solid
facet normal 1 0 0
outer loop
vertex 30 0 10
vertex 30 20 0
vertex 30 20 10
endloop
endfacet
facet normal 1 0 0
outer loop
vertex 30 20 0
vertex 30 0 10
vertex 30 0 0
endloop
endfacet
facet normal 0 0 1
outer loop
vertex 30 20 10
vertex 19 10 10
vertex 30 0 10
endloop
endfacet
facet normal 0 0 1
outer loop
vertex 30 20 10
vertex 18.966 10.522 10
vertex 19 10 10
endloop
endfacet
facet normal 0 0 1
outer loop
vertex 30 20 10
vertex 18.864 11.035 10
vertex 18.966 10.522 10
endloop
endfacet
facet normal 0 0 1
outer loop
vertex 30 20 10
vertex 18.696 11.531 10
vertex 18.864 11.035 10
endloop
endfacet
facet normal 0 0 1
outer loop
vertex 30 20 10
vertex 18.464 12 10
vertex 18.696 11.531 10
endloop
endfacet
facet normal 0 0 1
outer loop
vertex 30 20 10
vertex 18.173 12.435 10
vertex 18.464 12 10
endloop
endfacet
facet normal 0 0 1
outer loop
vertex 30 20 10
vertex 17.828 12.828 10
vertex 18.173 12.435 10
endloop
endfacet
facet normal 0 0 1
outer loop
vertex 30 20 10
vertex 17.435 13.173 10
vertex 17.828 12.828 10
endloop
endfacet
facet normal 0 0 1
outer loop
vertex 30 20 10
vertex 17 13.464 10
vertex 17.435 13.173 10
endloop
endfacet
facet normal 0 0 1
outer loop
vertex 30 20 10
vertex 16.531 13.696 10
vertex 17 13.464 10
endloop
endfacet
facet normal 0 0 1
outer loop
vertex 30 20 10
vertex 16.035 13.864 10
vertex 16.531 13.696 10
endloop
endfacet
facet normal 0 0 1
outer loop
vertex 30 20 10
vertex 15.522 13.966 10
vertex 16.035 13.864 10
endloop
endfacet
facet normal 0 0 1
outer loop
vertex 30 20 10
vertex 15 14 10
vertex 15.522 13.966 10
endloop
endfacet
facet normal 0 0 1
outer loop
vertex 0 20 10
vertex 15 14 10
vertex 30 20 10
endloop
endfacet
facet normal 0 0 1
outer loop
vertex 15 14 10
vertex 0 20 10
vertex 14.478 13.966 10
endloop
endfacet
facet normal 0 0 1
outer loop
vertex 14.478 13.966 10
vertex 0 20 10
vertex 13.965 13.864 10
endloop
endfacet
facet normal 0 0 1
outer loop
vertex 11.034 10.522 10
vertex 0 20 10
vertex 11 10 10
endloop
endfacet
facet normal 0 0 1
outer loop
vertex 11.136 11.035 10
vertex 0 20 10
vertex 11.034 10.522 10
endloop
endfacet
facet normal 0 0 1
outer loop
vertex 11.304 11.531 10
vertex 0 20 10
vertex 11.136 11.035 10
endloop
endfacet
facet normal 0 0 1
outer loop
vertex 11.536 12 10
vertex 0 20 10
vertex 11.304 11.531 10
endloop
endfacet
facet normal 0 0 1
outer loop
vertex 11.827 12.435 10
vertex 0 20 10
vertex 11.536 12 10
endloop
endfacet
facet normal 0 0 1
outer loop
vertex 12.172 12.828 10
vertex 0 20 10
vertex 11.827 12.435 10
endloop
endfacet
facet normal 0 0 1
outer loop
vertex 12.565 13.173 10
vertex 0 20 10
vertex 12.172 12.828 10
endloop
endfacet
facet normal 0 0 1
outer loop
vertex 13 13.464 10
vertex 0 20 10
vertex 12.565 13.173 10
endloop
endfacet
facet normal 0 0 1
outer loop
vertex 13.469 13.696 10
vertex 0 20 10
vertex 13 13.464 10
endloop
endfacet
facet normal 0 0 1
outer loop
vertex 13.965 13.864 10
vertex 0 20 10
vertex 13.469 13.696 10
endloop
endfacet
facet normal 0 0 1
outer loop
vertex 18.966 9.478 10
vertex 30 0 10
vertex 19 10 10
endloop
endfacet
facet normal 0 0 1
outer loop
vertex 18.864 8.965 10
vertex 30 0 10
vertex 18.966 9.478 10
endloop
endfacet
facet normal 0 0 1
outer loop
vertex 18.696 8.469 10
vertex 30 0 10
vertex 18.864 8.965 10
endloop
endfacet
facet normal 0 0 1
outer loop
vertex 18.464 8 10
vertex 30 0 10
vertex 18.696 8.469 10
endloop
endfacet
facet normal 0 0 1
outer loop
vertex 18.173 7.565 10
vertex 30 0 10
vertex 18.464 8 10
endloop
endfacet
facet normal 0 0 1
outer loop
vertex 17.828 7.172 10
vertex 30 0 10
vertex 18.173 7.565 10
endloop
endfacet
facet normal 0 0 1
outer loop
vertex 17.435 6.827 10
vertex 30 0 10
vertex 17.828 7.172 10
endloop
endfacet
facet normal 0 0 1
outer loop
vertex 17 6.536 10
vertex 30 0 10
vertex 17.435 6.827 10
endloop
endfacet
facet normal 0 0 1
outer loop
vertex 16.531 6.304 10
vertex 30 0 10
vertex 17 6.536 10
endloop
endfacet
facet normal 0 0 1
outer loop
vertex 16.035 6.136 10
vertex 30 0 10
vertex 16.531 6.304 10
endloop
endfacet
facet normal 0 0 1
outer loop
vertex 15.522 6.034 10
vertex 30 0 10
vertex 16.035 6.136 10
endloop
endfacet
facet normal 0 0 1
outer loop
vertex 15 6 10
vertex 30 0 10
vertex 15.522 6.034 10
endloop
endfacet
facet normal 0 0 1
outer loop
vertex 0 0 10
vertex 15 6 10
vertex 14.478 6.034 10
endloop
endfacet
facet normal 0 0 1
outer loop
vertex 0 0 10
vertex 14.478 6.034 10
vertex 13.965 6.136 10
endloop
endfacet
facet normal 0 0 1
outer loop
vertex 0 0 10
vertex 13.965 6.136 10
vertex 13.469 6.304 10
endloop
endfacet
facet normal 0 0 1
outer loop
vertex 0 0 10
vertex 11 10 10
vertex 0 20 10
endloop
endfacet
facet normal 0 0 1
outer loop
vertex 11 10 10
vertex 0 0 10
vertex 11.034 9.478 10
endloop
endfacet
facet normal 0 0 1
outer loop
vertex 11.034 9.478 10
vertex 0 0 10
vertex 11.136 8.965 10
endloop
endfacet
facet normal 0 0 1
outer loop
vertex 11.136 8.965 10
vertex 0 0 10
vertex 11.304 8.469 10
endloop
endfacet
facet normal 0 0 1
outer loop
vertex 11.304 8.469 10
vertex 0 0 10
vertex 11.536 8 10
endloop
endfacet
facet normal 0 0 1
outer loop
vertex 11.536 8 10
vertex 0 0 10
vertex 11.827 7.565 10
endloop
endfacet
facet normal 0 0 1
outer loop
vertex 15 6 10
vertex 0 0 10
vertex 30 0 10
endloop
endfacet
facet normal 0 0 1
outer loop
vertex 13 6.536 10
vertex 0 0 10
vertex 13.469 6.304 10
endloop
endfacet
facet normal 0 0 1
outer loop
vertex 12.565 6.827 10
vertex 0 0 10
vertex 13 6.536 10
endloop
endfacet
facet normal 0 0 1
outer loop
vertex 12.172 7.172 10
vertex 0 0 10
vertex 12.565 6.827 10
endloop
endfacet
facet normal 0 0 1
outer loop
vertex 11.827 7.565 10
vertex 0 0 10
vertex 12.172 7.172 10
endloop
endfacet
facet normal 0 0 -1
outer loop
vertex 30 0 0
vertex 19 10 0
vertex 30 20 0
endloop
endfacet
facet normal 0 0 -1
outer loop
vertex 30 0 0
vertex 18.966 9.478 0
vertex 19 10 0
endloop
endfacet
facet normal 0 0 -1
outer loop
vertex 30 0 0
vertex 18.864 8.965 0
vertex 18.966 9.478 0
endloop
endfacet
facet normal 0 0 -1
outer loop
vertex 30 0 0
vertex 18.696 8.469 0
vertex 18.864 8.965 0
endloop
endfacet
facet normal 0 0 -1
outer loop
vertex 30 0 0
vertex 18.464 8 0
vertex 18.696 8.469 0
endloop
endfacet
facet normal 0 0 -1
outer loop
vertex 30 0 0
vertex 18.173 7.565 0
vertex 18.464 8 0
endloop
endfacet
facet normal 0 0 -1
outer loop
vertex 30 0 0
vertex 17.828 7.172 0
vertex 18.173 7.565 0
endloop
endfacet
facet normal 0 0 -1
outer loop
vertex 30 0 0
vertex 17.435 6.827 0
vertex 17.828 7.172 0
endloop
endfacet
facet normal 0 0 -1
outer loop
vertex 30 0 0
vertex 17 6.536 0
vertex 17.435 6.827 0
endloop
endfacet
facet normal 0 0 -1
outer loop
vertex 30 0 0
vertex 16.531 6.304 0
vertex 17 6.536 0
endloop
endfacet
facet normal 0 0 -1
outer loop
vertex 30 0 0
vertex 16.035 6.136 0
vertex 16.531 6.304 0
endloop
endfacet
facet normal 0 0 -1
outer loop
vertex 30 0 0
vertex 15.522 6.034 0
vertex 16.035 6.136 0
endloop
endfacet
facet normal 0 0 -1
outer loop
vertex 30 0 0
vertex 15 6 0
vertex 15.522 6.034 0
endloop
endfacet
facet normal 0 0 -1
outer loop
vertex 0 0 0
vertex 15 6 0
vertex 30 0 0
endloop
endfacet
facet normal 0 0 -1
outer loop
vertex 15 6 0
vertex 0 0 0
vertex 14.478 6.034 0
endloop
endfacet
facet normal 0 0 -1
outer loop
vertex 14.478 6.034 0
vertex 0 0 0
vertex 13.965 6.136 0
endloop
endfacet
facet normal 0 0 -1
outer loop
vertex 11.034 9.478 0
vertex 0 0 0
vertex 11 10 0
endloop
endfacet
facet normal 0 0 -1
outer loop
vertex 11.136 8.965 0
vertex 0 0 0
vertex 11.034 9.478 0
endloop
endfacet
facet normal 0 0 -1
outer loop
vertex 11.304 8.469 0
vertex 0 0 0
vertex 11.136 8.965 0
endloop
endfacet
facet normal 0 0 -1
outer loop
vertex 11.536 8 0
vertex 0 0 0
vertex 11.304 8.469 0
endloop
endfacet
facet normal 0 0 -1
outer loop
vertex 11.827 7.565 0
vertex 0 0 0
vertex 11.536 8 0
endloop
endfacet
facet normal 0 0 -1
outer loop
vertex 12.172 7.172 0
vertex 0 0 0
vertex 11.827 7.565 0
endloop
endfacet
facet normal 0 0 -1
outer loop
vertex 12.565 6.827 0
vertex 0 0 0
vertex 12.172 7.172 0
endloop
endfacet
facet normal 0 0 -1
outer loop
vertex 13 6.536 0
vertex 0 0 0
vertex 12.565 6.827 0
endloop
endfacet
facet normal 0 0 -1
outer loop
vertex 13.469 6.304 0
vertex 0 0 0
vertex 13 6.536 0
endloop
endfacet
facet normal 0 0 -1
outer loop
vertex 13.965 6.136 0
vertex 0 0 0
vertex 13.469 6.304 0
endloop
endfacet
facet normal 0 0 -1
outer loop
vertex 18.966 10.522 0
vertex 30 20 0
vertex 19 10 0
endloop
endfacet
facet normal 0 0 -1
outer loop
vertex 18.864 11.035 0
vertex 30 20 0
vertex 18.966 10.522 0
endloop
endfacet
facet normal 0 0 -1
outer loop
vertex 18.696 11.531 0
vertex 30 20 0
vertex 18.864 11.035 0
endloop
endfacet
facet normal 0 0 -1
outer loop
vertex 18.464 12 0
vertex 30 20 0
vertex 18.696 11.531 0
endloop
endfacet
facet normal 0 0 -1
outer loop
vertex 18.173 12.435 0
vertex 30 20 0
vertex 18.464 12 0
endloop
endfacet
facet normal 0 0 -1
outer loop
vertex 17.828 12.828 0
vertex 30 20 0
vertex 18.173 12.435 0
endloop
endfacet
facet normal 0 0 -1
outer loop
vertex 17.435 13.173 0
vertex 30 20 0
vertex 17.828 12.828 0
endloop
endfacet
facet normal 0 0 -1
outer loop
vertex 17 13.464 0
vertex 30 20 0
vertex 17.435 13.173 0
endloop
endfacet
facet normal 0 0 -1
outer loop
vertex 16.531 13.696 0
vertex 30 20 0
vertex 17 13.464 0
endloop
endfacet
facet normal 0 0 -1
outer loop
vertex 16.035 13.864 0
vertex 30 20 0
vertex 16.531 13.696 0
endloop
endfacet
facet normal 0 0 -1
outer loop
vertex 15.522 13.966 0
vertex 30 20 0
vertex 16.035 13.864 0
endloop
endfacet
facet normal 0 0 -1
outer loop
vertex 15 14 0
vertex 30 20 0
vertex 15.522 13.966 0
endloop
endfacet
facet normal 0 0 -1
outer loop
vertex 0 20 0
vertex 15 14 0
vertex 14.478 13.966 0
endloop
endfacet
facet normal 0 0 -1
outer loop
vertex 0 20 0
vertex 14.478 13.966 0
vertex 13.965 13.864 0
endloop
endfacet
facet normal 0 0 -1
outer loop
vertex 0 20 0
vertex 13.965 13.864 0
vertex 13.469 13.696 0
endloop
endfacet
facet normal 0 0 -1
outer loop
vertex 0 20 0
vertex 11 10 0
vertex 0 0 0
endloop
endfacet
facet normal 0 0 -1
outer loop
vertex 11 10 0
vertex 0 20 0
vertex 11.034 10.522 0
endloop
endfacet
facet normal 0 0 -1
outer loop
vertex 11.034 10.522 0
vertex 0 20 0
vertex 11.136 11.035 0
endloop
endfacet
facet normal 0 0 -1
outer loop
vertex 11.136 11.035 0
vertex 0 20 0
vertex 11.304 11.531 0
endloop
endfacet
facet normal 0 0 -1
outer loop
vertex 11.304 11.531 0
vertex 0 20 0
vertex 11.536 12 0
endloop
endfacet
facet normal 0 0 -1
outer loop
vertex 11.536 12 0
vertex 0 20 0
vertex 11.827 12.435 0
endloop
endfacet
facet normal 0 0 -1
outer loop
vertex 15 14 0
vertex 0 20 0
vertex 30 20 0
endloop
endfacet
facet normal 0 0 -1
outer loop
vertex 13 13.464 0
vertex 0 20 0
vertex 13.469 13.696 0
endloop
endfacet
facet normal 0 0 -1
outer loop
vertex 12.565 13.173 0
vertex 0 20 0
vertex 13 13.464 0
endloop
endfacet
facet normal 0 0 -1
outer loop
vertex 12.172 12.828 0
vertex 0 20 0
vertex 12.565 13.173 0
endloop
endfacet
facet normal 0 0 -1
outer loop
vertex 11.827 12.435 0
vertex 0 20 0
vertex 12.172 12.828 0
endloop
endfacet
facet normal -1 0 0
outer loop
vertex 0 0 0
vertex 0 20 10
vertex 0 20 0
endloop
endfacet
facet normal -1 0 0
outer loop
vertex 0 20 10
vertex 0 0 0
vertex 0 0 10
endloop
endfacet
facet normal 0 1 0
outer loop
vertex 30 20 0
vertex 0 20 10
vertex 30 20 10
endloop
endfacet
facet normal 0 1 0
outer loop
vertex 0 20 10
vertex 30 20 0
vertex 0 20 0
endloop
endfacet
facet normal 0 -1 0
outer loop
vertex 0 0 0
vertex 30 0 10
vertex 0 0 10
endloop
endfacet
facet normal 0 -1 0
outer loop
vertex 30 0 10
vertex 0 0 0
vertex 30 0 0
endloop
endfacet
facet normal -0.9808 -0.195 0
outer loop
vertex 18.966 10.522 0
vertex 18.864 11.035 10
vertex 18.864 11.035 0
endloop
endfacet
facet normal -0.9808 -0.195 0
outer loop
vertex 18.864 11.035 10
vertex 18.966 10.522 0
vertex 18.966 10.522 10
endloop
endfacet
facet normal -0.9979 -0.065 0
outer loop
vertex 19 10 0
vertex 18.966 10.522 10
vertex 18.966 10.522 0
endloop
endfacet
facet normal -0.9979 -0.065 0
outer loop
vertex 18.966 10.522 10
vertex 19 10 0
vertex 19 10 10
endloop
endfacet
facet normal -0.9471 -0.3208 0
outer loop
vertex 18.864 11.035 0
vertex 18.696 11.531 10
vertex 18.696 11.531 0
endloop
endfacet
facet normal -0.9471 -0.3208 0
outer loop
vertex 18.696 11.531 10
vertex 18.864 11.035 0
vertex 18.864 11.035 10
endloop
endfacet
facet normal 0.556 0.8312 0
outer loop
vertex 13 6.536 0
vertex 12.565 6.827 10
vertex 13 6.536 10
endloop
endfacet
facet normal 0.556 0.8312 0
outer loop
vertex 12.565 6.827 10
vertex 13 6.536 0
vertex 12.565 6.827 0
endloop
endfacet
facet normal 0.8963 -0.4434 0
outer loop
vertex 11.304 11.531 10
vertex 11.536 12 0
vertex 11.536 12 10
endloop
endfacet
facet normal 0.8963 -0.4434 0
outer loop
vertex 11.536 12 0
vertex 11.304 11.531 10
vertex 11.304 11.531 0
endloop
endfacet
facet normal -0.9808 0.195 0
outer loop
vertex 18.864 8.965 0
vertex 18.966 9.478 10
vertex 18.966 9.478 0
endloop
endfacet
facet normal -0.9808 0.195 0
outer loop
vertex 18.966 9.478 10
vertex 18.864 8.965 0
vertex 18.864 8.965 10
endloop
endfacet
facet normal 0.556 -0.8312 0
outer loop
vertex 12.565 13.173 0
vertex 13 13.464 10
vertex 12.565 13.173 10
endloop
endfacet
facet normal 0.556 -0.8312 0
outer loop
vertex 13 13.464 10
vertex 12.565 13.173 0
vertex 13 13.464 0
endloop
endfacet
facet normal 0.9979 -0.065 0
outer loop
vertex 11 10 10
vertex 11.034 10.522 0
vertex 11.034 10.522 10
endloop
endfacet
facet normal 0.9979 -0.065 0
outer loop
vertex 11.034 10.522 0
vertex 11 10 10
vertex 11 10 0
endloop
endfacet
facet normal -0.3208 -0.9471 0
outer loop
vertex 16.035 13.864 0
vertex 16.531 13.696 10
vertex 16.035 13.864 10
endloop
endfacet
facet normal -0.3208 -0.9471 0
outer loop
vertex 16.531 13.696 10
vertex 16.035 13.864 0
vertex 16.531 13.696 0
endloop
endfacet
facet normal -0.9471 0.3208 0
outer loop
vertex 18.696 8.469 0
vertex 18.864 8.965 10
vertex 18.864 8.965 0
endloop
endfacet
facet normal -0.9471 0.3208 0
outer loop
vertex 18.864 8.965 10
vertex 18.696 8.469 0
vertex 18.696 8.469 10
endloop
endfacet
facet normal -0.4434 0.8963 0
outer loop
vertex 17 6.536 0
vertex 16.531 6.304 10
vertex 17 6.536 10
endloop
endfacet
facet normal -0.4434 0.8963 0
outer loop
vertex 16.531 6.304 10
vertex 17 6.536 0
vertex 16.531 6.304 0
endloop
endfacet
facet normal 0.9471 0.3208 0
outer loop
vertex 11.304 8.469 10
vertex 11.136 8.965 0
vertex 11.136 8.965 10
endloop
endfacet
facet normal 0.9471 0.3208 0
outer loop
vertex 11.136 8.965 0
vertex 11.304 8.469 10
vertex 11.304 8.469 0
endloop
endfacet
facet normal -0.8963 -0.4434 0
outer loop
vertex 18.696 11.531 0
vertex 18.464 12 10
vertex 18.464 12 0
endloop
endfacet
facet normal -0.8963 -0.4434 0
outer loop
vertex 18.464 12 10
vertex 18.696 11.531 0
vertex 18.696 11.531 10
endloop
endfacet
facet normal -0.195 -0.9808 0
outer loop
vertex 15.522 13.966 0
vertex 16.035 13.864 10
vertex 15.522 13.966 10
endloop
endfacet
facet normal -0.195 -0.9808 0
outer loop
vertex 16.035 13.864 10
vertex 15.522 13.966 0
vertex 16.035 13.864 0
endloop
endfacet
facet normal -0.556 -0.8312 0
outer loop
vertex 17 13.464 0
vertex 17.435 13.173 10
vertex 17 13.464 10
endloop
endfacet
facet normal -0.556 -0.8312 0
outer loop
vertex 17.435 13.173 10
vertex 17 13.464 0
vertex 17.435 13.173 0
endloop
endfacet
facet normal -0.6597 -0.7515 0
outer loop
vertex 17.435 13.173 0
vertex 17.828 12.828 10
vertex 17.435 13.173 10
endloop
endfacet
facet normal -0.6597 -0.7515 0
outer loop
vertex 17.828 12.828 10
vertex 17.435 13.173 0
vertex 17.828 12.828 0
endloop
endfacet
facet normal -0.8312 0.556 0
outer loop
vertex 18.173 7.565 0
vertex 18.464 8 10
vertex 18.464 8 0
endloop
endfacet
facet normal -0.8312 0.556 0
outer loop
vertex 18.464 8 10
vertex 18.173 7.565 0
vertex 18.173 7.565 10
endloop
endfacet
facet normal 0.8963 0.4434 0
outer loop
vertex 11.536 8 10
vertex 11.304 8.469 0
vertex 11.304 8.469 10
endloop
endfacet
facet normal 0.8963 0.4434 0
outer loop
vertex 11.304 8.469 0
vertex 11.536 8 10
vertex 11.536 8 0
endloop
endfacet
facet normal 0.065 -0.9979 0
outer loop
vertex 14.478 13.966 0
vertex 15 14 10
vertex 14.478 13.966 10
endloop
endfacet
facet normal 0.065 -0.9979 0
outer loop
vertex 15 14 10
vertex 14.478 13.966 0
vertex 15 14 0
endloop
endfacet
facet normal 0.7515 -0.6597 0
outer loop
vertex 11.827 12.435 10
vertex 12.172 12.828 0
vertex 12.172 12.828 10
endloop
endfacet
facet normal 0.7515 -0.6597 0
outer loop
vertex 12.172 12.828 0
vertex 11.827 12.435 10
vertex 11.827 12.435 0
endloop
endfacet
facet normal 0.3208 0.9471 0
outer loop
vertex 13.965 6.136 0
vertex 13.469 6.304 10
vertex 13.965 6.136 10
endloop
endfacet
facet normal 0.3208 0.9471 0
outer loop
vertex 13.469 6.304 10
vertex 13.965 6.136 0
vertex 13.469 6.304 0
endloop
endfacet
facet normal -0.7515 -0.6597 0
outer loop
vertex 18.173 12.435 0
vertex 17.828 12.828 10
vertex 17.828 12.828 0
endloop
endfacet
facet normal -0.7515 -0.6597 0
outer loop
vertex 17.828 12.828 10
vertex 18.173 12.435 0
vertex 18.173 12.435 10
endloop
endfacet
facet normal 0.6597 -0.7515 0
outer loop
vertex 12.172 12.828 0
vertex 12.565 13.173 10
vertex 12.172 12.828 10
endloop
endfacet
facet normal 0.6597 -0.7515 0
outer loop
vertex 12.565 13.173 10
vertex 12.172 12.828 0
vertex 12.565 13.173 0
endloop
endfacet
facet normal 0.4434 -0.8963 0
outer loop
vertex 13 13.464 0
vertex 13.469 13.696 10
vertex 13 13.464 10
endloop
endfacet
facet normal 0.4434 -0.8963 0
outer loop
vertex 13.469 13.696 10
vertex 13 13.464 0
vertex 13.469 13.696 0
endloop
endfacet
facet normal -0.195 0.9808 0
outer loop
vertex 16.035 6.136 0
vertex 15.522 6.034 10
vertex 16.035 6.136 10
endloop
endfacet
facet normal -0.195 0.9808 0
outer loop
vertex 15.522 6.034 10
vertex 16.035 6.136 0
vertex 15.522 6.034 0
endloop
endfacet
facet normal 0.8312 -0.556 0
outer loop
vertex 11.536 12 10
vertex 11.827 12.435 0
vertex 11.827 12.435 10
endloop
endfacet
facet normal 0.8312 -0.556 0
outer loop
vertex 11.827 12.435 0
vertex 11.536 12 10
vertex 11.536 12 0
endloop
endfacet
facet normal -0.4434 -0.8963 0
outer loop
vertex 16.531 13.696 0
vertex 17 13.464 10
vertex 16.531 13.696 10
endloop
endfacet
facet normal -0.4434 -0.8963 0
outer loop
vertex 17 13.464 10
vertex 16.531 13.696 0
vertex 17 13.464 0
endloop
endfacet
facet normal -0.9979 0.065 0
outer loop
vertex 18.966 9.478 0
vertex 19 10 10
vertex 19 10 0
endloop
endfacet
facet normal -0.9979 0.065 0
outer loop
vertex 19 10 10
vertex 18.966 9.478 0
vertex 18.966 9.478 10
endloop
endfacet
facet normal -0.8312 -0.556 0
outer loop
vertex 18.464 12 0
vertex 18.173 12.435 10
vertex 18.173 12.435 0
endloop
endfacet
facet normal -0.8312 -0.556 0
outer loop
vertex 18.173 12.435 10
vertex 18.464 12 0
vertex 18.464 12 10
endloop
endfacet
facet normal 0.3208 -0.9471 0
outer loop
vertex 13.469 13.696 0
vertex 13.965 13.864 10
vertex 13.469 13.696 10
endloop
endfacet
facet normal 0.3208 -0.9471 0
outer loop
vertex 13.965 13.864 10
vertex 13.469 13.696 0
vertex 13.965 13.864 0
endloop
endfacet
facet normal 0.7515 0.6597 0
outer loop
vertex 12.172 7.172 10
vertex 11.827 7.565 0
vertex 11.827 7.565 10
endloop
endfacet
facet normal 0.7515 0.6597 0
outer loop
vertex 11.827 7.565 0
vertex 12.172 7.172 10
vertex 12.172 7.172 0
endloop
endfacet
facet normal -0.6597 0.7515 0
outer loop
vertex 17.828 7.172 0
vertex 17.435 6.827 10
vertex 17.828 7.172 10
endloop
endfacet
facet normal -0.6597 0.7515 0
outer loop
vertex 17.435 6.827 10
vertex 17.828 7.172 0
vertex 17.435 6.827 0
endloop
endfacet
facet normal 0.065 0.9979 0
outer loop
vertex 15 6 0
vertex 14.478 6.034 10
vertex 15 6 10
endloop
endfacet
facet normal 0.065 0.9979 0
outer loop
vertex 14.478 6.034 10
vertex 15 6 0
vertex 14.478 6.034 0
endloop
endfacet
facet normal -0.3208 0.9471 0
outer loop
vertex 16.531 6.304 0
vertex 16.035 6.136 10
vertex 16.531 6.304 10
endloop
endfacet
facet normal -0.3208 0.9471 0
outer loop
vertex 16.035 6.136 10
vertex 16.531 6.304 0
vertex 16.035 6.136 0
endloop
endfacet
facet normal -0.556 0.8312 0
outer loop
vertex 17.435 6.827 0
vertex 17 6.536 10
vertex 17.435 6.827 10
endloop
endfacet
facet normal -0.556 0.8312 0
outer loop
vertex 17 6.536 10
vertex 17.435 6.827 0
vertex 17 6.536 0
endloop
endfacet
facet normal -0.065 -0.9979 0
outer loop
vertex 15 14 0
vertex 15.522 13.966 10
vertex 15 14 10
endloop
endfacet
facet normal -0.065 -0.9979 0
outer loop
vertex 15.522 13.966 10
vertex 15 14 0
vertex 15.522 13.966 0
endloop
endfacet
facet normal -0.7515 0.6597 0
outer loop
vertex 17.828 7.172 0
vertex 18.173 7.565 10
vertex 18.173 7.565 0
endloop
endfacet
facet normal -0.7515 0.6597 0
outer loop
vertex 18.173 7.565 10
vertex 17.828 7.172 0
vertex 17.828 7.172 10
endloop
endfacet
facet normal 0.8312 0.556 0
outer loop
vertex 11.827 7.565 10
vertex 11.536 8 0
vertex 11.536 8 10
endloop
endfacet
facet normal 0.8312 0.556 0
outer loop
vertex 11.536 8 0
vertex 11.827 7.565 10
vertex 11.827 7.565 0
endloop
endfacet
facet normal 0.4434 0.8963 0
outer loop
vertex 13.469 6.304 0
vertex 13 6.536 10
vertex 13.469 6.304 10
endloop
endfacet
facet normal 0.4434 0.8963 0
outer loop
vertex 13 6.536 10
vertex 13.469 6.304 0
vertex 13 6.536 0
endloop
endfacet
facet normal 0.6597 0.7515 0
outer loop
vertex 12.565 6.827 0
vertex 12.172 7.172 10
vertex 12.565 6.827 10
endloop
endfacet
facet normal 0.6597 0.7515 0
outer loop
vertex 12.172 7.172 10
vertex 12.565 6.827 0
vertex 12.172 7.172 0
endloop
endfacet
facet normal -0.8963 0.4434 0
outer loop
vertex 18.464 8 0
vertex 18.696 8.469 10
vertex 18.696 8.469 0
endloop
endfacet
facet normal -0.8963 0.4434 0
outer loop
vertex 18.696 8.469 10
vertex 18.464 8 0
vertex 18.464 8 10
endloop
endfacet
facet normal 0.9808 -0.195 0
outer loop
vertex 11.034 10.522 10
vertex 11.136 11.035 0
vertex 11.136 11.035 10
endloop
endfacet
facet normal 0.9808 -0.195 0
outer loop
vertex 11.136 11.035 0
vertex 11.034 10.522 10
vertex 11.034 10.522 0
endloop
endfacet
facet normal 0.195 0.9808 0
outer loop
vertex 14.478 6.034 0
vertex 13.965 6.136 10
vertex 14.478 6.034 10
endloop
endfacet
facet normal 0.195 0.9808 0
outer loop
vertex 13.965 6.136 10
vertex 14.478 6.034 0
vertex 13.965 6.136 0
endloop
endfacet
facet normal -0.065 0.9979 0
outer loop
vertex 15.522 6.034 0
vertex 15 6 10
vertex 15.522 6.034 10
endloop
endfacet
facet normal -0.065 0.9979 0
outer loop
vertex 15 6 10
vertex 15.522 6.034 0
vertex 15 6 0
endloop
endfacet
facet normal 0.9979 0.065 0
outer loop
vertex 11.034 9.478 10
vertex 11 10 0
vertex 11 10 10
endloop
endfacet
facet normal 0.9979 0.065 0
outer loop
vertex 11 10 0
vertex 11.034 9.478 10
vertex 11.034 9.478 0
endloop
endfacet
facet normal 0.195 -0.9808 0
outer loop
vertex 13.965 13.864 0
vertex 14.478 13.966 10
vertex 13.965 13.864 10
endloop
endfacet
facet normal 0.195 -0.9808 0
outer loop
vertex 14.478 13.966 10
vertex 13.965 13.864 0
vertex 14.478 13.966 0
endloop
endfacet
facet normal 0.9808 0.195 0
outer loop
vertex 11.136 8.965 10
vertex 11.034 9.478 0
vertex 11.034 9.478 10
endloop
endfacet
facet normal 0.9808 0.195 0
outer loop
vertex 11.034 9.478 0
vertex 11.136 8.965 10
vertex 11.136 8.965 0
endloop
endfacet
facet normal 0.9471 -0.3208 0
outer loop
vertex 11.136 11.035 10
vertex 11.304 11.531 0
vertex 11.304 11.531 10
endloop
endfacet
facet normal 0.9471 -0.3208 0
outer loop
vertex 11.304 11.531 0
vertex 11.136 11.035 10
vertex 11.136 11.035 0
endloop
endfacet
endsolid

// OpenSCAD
// cube with a through hole
$fn = 48;
w = 30; d = 20; h = 10; bore = 8;
difference() {
  cube([w, d, h]);
  translate([w/2, d/2, -1]) cylinder(h = h + 2, d = bore);
}
